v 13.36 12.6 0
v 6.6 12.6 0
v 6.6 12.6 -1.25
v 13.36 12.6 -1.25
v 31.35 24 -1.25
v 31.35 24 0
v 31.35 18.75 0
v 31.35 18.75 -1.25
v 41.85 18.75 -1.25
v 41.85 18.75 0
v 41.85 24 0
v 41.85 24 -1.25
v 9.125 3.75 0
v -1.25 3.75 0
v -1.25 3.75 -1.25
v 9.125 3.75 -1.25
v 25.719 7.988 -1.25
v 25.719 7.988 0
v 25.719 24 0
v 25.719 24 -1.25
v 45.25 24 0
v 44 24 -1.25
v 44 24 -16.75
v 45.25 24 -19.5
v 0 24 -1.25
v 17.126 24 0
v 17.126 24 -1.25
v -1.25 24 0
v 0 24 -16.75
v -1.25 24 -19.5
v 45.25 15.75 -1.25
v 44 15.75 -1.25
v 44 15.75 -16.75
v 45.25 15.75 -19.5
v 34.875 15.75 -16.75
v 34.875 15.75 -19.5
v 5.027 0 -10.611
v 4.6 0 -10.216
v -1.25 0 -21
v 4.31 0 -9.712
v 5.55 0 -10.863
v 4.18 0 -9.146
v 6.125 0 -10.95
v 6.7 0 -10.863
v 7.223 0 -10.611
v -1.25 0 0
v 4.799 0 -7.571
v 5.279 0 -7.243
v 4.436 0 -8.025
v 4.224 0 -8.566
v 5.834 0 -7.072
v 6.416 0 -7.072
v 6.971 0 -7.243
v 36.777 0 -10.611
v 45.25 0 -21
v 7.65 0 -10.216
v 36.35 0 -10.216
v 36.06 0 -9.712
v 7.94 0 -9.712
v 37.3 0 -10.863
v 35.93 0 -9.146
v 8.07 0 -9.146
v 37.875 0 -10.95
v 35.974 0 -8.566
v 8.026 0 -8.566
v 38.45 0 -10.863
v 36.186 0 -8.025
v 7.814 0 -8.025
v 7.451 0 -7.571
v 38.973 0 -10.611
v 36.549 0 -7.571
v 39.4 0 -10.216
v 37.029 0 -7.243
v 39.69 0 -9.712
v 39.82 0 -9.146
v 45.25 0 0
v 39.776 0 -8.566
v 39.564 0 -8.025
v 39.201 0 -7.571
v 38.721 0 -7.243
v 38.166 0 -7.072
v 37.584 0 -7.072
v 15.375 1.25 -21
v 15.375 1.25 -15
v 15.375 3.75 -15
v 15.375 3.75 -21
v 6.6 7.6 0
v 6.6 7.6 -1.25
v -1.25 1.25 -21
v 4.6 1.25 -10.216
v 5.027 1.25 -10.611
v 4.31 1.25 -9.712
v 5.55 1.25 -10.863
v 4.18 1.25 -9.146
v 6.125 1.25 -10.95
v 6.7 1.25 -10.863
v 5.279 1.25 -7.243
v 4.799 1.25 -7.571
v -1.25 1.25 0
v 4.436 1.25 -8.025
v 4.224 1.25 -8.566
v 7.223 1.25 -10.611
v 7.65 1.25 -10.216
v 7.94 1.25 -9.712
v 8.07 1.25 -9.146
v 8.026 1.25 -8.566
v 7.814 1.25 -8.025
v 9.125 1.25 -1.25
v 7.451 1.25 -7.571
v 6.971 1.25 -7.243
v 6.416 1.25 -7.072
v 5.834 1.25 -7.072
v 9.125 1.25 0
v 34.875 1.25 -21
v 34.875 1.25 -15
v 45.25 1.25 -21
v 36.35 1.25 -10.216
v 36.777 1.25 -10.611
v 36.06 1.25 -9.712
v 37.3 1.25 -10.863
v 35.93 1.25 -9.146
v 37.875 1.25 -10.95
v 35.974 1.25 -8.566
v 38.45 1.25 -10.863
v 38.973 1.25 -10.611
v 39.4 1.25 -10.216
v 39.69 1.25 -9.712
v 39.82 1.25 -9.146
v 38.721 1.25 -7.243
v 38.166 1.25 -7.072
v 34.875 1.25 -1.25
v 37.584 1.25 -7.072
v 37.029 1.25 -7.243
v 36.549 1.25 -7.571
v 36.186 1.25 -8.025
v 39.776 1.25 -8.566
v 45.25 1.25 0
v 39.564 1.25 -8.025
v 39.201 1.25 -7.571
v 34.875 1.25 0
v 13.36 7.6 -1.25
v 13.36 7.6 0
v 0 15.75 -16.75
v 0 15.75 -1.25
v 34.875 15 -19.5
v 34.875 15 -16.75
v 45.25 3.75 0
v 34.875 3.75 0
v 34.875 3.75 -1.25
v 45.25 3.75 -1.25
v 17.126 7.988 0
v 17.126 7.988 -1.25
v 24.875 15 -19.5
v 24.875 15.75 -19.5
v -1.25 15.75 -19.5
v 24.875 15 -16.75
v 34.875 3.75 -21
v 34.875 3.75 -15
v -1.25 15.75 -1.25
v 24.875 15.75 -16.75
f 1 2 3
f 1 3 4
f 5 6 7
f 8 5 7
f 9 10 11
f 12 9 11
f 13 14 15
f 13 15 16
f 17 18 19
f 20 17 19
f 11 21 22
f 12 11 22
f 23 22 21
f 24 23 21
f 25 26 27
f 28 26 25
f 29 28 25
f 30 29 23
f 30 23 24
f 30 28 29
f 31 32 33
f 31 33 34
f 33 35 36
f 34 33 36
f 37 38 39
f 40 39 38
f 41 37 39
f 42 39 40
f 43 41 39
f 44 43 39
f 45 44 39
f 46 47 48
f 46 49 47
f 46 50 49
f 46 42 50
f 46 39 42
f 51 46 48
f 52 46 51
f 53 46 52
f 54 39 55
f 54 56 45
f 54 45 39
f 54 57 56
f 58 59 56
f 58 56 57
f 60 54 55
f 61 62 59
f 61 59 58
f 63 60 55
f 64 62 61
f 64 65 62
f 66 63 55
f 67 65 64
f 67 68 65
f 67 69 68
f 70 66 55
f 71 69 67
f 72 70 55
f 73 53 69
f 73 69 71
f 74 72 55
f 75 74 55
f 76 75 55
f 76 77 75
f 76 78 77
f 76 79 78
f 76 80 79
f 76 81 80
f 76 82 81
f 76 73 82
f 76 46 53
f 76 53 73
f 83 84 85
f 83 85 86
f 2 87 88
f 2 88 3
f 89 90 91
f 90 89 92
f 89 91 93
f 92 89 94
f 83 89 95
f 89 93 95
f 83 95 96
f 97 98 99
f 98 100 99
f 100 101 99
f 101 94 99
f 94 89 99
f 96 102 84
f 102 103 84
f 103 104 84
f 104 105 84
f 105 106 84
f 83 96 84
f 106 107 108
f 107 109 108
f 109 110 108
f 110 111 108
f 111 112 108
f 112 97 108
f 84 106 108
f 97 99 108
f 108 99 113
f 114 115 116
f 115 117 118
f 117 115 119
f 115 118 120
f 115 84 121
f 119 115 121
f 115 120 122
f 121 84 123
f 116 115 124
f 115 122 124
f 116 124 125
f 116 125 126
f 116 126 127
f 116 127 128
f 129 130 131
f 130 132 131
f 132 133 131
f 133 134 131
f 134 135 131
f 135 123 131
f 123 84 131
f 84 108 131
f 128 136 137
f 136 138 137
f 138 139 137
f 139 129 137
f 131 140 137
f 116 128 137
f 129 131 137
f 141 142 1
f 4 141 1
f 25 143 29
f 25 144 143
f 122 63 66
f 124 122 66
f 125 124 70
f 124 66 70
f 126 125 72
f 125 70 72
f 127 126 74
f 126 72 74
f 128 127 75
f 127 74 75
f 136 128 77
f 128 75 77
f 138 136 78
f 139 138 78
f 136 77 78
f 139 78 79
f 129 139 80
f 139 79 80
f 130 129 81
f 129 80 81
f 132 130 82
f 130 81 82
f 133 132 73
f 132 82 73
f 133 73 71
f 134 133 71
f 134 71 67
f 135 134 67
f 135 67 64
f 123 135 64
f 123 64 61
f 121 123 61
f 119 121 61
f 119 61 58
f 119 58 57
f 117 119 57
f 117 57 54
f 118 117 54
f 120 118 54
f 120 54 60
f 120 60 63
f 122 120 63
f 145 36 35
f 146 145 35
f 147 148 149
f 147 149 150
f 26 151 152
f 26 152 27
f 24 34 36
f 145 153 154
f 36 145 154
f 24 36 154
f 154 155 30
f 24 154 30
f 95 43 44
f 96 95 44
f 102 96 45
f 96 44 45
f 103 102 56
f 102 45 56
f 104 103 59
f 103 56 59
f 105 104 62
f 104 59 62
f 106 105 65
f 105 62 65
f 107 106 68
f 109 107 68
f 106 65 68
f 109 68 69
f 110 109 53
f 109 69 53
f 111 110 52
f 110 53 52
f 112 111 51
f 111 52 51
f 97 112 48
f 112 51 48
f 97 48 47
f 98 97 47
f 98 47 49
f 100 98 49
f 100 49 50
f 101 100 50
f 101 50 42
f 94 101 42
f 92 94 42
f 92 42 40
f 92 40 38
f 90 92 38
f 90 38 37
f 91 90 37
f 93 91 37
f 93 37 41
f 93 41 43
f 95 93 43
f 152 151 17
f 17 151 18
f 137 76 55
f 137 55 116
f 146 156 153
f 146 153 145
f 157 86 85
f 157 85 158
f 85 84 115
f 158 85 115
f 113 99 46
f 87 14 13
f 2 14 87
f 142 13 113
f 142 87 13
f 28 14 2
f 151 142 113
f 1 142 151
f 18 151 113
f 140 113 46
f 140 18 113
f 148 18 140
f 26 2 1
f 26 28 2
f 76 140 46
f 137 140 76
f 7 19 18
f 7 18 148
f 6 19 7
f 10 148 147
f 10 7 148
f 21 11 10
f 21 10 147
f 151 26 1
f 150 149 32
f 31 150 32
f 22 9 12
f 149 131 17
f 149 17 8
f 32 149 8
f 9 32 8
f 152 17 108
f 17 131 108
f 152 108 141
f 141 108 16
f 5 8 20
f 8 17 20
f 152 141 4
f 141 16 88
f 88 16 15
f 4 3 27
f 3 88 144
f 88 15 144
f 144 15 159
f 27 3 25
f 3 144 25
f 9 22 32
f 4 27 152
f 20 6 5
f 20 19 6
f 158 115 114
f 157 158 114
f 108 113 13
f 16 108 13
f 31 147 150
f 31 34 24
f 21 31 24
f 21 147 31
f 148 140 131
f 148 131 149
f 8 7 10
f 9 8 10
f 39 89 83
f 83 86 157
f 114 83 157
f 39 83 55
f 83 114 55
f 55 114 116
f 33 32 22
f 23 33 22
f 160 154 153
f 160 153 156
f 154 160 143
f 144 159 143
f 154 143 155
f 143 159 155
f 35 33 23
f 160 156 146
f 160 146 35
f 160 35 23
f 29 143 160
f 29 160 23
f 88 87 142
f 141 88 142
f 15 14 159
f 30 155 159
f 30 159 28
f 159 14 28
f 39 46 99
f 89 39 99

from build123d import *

# Parameters (mm, degrees)
SKETCH1_W               = 46.5
SKETCH1_H               = 24
BOSS_EXTRUDE1_DEPTH     = 21
SHELL1_T                = -1.25
SKETCH2_W               = 19.75
SKETCH2_H               = 14.5
CUT_EXTRUDE1_DEPTH      = 57.384838388
CUT_EXTRUDE4_REACH      = 57.358
SKETCH6_R               = 1.95
CUT_EXTRUDE5_REACH      = 57.358
SKETCH7_W               = 10.375
SKETCH7_H               = 2.5
SKETCH9_W               = 19.5
SKETCH9_H               = 6
BOSS_EXTRUDE3_DEPTH     = 2.5
CUT_EXTRUDE7_DEPTH      = 102.634838388
CUT_EXTRUDE7_DEPTH_BACK = 57.384838388
CUT_EXTRUDE7_START      = -45.25
SKETCH12_W              = 1.5
SKETCH12_H              = 8.25
SKETCH13_W              = 2.75
SKETCH13_H              = 8.25
BOSS_EXTRUDE4_DEPTH     = 44
SKETCH15_W              = 10
SKETCH15_H              = 2.75
BOSS_EXTRUDE5_DEPTH     = 0.75
CUT_EXTRUDE8_REACH      = 57.358
SKETCH18_W              = 6.76
SKETCH18_H              = 5
CUT_EXTRUDE9_REACH      = 57.358
SKETCH22_W              = 8.593751287
SKETCH22_H              = 16.011767213
CUT_EXTRUDE15_REACH     = 57.358
SKETCH25_W              = 10
SKETCH25_H              = 4.5


with BuildPart() as part:
    # Sketch1 → Boss-Extrude1 (new body)
    with BuildSketch(Plane.XY):
        with Locations((22, 12)):
            Rectangle(SKETCH1_W, SKETCH1_H)
    extrude(amount=-BOSS_EXTRUDE1_DEPTH)

    # Shell1
    shell1_openings = [part.faces().sort_by_distance(p)[0] for p in [
        (22, 12, -21),
        (22, 24, -10.5),
    ]]
    offset(amount=SHELL1_T, openings=shell1_openings, kind=Kind.INTERSECTION)

    # Sketch2 → Cut-Extrude1 (cut, through all)
    with BuildSketch(Plane.ZY.offset(1.25)):
        with Locations((-11.125, 8.5)):
            Rectangle(SKETCH2_W, SKETCH2_H)
    extrude(amount=-CUT_EXTRUDE1_DEPTH, mode=Mode.SUBTRACT)

    # Sketch6 → Cut-Extrude4 (cut, up to next)
    with BuildSketch(Plane(origin=(0, 0, 0), x_dir=(-1, 0, 0), z_dir=(0, -1, 0)), mode=Mode.PRIVATE) as cut_extrude4_sk1:
        with Locations(Location((-6.125, 9, 0), (0, 0, 90))):
            Circle(SKETCH6_R)
    cut_extrude4_tool1 = extrude(cut_extrude4_sk1.sketch, amount=-CUT_EXTRUDE4_REACH, mode=Mode.PRIVATE) & part.part
    # Sketch6 → Cut-Extrude4 (cut, up to next)
    with BuildSketch(Plane(origin=(0, 0, 0), x_dir=(-1, 0, 0), z_dir=(0, -1, 0)), mode=Mode.PRIVATE) as cut_extrude4_sk2:
        with Locations(Location((-37.875, 9, 0), (0, 0, 90))):
            Circle(SKETCH6_R)
    cut_extrude4_tool2 = extrude(cut_extrude4_sk2.sketch, amount=-CUT_EXTRUDE4_REACH, mode=Mode.PRIVATE) & part.part
    add(cut_extrude4_tool1.solids().sort_by_distance((6.125, 0, -9))[0], mode=Mode.SUBTRACT)
    add(cut_extrude4_tool2.solids().sort_by_distance((37.875, 0, -9))[0], mode=Mode.SUBTRACT)

    # Sketch7 → Cut-Extrude5 (cut, up to next)
    with BuildSketch(Plane.XY, mode=Mode.PRIVATE) as cut_extrude5_sk1:
        with Locations((40.0625, 2.5)):
            Rectangle(SKETCH7_W, SKETCH7_H)
    cut_extrude5_tool1 = extrude(cut_extrude5_sk1.sketch, amount=-CUT_EXTRUDE5_REACH, mode=Mode.PRIVATE) & part.part
    # Sketch7 → Cut-Extrude5 (cut, up to next)
    with BuildSketch(Plane.XY, mode=Mode.PRIVATE) as cut_extrude5_sk2:
        with Locations((3.9375, 2.5)):
            Rectangle(SKETCH7_W, SKETCH7_H)
    cut_extrude5_tool2 = extrude(cut_extrude5_sk2.sketch, amount=-CUT_EXTRUDE5_REACH, mode=Mode.PRIVATE) & part.part
    add(cut_extrude5_tool1.solids().sort_by_distance((40.0625, 2.5, 0))[0], mode=Mode.SUBTRACT)
    add(cut_extrude5_tool2.solids().sort_by_distance((3.9375, 2.5, 0))[0], mode=Mode.SUBTRACT)

    # Sketch9 → Boss-Extrude3 (add)
    with BuildSketch(Plane(origin=(0, 1.25, 0), x_dir=(1, 0, 0), z_dir=(0, 1, 0))):
        with Locations((25.125, 18)):
            Rectangle(SKETCH9_W, SKETCH9_H)
    extrude(amount=BOSS_EXTRUDE3_DEPTH)

    # Sketch12 → Cut-Extrude7 (cut, two sides: drawn at the far end of the back side and taken through both)
    with BuildSketch(Plane(origin=(45.25, 0, 0), x_dir=(0, 0, -1), z_dir=(1, 0, 0)).offset(CUT_EXTRUDE7_START - CUT_EXTRUDE7_DEPTH_BACK)):
        with Locations((20.25, 19.875)):
            Rectangle(SKETCH12_W, SKETCH12_H)
    extrude(amount=CUT_EXTRUDE7_DEPTH + CUT_EXTRUDE7_DEPTH_BACK, mode=Mode.SUBTRACT)

    # Sketch13 → Boss-Extrude4 (add)
    with BuildSketch(Plane(origin=(0, 0, 0), x_dir=(0, 0, -1), z_dir=(1, 0, 0))):
        with Locations((18.125, 19.875)):
            Rectangle(SKETCH13_W, SKETCH13_H)
    extrude(amount=BOSS_EXTRUDE4_DEPTH)

    # Sketch15 → Boss-Extrude5 (add)
    with BuildSketch(Plane.XZ.offset(-15.75)):
        with Locations((29.875, -18.125)):
            Rectangle(SKETCH15_W, SKETCH15_H)
    extrude(amount=BOSS_EXTRUDE5_DEPTH)

    # Sketch18 → Cut-Extrude8 (cut, up to next)
    with BuildSketch(Plane.XY, mode=Mode.PRIVATE) as cut_extrude8_sk1:
        with Locations((9.98, 10.1)):
            Rectangle(SKETCH18_W, SKETCH18_H)
    cut_extrude8_tool1 = extrude(cut_extrude8_sk1.sketch, amount=-CUT_EXTRUDE8_REACH, mode=Mode.PRIVATE) & part.part
    add(cut_extrude8_tool1.solids().sort_by_distance((9.98, 10.1, 0))[0], mode=Mode.SUBTRACT)

    # Sketch22 → Cut-Extrude9 (cut, up to next)
    with BuildSketch(Plane.XY, mode=Mode.PRIVATE) as cut_extrude9_sk1:
        with Locations((21.422492142, 15.994116394)):
            Rectangle(SKETCH22_W, SKETCH22_H)
    cut_extrude9_tool1 = extrude(cut_extrude9_sk1.sketch, amount=-CUT_EXTRUDE9_REACH, mode=Mode.PRIVATE) & part.part
    add(cut_extrude9_tool1.solids().sort_by_distance((21.422492, 15.994116, 0))[0], mode=Mode.SUBTRACT)

    # Sketch25 → Cut-Extrude15 (cut, up to next)
    with BuildSketch(Plane.XY, mode=Mode.PRIVATE) as cut_extrude15_sk1:
        Polygon((31.35, 18.75), (41.85, 18.75), (41.85, 24), (41.6, 24), (41.6, 19.5), (31.6, 19.5), (31.6, 24), (31.35, 24), align=None)
    cut_extrude15_tool1 = extrude(cut_extrude15_sk1.sketch, amount=-CUT_EXTRUDE15_REACH, mode=Mode.PRIVATE) & part.part
    # Sketch25 → Cut-Extrude15 (cut, up to next)
    with BuildSketch(Plane.XY, mode=Mode.PRIVATE) as cut_extrude15_sk2:
        with Locations((36.6, 21.75)):
            Rectangle(SKETCH25_W, SKETCH25_H)
    cut_extrude15_tool2 = extrude(cut_extrude15_sk2.sketch, amount=-CUT_EXTRUDE15_REACH, mode=Mode.PRIVATE) & part.part
    add(cut_extrude15_tool1.solids().sort_by_distance((31.475, 23.882606, 0))[0], mode=Mode.SUBTRACT)
    add(cut_extrude15_tool2.solids().sort_by_distance((36.6, 21.75, 0))[0], mode=Mode.SUBTRACT)


solid = part.part
